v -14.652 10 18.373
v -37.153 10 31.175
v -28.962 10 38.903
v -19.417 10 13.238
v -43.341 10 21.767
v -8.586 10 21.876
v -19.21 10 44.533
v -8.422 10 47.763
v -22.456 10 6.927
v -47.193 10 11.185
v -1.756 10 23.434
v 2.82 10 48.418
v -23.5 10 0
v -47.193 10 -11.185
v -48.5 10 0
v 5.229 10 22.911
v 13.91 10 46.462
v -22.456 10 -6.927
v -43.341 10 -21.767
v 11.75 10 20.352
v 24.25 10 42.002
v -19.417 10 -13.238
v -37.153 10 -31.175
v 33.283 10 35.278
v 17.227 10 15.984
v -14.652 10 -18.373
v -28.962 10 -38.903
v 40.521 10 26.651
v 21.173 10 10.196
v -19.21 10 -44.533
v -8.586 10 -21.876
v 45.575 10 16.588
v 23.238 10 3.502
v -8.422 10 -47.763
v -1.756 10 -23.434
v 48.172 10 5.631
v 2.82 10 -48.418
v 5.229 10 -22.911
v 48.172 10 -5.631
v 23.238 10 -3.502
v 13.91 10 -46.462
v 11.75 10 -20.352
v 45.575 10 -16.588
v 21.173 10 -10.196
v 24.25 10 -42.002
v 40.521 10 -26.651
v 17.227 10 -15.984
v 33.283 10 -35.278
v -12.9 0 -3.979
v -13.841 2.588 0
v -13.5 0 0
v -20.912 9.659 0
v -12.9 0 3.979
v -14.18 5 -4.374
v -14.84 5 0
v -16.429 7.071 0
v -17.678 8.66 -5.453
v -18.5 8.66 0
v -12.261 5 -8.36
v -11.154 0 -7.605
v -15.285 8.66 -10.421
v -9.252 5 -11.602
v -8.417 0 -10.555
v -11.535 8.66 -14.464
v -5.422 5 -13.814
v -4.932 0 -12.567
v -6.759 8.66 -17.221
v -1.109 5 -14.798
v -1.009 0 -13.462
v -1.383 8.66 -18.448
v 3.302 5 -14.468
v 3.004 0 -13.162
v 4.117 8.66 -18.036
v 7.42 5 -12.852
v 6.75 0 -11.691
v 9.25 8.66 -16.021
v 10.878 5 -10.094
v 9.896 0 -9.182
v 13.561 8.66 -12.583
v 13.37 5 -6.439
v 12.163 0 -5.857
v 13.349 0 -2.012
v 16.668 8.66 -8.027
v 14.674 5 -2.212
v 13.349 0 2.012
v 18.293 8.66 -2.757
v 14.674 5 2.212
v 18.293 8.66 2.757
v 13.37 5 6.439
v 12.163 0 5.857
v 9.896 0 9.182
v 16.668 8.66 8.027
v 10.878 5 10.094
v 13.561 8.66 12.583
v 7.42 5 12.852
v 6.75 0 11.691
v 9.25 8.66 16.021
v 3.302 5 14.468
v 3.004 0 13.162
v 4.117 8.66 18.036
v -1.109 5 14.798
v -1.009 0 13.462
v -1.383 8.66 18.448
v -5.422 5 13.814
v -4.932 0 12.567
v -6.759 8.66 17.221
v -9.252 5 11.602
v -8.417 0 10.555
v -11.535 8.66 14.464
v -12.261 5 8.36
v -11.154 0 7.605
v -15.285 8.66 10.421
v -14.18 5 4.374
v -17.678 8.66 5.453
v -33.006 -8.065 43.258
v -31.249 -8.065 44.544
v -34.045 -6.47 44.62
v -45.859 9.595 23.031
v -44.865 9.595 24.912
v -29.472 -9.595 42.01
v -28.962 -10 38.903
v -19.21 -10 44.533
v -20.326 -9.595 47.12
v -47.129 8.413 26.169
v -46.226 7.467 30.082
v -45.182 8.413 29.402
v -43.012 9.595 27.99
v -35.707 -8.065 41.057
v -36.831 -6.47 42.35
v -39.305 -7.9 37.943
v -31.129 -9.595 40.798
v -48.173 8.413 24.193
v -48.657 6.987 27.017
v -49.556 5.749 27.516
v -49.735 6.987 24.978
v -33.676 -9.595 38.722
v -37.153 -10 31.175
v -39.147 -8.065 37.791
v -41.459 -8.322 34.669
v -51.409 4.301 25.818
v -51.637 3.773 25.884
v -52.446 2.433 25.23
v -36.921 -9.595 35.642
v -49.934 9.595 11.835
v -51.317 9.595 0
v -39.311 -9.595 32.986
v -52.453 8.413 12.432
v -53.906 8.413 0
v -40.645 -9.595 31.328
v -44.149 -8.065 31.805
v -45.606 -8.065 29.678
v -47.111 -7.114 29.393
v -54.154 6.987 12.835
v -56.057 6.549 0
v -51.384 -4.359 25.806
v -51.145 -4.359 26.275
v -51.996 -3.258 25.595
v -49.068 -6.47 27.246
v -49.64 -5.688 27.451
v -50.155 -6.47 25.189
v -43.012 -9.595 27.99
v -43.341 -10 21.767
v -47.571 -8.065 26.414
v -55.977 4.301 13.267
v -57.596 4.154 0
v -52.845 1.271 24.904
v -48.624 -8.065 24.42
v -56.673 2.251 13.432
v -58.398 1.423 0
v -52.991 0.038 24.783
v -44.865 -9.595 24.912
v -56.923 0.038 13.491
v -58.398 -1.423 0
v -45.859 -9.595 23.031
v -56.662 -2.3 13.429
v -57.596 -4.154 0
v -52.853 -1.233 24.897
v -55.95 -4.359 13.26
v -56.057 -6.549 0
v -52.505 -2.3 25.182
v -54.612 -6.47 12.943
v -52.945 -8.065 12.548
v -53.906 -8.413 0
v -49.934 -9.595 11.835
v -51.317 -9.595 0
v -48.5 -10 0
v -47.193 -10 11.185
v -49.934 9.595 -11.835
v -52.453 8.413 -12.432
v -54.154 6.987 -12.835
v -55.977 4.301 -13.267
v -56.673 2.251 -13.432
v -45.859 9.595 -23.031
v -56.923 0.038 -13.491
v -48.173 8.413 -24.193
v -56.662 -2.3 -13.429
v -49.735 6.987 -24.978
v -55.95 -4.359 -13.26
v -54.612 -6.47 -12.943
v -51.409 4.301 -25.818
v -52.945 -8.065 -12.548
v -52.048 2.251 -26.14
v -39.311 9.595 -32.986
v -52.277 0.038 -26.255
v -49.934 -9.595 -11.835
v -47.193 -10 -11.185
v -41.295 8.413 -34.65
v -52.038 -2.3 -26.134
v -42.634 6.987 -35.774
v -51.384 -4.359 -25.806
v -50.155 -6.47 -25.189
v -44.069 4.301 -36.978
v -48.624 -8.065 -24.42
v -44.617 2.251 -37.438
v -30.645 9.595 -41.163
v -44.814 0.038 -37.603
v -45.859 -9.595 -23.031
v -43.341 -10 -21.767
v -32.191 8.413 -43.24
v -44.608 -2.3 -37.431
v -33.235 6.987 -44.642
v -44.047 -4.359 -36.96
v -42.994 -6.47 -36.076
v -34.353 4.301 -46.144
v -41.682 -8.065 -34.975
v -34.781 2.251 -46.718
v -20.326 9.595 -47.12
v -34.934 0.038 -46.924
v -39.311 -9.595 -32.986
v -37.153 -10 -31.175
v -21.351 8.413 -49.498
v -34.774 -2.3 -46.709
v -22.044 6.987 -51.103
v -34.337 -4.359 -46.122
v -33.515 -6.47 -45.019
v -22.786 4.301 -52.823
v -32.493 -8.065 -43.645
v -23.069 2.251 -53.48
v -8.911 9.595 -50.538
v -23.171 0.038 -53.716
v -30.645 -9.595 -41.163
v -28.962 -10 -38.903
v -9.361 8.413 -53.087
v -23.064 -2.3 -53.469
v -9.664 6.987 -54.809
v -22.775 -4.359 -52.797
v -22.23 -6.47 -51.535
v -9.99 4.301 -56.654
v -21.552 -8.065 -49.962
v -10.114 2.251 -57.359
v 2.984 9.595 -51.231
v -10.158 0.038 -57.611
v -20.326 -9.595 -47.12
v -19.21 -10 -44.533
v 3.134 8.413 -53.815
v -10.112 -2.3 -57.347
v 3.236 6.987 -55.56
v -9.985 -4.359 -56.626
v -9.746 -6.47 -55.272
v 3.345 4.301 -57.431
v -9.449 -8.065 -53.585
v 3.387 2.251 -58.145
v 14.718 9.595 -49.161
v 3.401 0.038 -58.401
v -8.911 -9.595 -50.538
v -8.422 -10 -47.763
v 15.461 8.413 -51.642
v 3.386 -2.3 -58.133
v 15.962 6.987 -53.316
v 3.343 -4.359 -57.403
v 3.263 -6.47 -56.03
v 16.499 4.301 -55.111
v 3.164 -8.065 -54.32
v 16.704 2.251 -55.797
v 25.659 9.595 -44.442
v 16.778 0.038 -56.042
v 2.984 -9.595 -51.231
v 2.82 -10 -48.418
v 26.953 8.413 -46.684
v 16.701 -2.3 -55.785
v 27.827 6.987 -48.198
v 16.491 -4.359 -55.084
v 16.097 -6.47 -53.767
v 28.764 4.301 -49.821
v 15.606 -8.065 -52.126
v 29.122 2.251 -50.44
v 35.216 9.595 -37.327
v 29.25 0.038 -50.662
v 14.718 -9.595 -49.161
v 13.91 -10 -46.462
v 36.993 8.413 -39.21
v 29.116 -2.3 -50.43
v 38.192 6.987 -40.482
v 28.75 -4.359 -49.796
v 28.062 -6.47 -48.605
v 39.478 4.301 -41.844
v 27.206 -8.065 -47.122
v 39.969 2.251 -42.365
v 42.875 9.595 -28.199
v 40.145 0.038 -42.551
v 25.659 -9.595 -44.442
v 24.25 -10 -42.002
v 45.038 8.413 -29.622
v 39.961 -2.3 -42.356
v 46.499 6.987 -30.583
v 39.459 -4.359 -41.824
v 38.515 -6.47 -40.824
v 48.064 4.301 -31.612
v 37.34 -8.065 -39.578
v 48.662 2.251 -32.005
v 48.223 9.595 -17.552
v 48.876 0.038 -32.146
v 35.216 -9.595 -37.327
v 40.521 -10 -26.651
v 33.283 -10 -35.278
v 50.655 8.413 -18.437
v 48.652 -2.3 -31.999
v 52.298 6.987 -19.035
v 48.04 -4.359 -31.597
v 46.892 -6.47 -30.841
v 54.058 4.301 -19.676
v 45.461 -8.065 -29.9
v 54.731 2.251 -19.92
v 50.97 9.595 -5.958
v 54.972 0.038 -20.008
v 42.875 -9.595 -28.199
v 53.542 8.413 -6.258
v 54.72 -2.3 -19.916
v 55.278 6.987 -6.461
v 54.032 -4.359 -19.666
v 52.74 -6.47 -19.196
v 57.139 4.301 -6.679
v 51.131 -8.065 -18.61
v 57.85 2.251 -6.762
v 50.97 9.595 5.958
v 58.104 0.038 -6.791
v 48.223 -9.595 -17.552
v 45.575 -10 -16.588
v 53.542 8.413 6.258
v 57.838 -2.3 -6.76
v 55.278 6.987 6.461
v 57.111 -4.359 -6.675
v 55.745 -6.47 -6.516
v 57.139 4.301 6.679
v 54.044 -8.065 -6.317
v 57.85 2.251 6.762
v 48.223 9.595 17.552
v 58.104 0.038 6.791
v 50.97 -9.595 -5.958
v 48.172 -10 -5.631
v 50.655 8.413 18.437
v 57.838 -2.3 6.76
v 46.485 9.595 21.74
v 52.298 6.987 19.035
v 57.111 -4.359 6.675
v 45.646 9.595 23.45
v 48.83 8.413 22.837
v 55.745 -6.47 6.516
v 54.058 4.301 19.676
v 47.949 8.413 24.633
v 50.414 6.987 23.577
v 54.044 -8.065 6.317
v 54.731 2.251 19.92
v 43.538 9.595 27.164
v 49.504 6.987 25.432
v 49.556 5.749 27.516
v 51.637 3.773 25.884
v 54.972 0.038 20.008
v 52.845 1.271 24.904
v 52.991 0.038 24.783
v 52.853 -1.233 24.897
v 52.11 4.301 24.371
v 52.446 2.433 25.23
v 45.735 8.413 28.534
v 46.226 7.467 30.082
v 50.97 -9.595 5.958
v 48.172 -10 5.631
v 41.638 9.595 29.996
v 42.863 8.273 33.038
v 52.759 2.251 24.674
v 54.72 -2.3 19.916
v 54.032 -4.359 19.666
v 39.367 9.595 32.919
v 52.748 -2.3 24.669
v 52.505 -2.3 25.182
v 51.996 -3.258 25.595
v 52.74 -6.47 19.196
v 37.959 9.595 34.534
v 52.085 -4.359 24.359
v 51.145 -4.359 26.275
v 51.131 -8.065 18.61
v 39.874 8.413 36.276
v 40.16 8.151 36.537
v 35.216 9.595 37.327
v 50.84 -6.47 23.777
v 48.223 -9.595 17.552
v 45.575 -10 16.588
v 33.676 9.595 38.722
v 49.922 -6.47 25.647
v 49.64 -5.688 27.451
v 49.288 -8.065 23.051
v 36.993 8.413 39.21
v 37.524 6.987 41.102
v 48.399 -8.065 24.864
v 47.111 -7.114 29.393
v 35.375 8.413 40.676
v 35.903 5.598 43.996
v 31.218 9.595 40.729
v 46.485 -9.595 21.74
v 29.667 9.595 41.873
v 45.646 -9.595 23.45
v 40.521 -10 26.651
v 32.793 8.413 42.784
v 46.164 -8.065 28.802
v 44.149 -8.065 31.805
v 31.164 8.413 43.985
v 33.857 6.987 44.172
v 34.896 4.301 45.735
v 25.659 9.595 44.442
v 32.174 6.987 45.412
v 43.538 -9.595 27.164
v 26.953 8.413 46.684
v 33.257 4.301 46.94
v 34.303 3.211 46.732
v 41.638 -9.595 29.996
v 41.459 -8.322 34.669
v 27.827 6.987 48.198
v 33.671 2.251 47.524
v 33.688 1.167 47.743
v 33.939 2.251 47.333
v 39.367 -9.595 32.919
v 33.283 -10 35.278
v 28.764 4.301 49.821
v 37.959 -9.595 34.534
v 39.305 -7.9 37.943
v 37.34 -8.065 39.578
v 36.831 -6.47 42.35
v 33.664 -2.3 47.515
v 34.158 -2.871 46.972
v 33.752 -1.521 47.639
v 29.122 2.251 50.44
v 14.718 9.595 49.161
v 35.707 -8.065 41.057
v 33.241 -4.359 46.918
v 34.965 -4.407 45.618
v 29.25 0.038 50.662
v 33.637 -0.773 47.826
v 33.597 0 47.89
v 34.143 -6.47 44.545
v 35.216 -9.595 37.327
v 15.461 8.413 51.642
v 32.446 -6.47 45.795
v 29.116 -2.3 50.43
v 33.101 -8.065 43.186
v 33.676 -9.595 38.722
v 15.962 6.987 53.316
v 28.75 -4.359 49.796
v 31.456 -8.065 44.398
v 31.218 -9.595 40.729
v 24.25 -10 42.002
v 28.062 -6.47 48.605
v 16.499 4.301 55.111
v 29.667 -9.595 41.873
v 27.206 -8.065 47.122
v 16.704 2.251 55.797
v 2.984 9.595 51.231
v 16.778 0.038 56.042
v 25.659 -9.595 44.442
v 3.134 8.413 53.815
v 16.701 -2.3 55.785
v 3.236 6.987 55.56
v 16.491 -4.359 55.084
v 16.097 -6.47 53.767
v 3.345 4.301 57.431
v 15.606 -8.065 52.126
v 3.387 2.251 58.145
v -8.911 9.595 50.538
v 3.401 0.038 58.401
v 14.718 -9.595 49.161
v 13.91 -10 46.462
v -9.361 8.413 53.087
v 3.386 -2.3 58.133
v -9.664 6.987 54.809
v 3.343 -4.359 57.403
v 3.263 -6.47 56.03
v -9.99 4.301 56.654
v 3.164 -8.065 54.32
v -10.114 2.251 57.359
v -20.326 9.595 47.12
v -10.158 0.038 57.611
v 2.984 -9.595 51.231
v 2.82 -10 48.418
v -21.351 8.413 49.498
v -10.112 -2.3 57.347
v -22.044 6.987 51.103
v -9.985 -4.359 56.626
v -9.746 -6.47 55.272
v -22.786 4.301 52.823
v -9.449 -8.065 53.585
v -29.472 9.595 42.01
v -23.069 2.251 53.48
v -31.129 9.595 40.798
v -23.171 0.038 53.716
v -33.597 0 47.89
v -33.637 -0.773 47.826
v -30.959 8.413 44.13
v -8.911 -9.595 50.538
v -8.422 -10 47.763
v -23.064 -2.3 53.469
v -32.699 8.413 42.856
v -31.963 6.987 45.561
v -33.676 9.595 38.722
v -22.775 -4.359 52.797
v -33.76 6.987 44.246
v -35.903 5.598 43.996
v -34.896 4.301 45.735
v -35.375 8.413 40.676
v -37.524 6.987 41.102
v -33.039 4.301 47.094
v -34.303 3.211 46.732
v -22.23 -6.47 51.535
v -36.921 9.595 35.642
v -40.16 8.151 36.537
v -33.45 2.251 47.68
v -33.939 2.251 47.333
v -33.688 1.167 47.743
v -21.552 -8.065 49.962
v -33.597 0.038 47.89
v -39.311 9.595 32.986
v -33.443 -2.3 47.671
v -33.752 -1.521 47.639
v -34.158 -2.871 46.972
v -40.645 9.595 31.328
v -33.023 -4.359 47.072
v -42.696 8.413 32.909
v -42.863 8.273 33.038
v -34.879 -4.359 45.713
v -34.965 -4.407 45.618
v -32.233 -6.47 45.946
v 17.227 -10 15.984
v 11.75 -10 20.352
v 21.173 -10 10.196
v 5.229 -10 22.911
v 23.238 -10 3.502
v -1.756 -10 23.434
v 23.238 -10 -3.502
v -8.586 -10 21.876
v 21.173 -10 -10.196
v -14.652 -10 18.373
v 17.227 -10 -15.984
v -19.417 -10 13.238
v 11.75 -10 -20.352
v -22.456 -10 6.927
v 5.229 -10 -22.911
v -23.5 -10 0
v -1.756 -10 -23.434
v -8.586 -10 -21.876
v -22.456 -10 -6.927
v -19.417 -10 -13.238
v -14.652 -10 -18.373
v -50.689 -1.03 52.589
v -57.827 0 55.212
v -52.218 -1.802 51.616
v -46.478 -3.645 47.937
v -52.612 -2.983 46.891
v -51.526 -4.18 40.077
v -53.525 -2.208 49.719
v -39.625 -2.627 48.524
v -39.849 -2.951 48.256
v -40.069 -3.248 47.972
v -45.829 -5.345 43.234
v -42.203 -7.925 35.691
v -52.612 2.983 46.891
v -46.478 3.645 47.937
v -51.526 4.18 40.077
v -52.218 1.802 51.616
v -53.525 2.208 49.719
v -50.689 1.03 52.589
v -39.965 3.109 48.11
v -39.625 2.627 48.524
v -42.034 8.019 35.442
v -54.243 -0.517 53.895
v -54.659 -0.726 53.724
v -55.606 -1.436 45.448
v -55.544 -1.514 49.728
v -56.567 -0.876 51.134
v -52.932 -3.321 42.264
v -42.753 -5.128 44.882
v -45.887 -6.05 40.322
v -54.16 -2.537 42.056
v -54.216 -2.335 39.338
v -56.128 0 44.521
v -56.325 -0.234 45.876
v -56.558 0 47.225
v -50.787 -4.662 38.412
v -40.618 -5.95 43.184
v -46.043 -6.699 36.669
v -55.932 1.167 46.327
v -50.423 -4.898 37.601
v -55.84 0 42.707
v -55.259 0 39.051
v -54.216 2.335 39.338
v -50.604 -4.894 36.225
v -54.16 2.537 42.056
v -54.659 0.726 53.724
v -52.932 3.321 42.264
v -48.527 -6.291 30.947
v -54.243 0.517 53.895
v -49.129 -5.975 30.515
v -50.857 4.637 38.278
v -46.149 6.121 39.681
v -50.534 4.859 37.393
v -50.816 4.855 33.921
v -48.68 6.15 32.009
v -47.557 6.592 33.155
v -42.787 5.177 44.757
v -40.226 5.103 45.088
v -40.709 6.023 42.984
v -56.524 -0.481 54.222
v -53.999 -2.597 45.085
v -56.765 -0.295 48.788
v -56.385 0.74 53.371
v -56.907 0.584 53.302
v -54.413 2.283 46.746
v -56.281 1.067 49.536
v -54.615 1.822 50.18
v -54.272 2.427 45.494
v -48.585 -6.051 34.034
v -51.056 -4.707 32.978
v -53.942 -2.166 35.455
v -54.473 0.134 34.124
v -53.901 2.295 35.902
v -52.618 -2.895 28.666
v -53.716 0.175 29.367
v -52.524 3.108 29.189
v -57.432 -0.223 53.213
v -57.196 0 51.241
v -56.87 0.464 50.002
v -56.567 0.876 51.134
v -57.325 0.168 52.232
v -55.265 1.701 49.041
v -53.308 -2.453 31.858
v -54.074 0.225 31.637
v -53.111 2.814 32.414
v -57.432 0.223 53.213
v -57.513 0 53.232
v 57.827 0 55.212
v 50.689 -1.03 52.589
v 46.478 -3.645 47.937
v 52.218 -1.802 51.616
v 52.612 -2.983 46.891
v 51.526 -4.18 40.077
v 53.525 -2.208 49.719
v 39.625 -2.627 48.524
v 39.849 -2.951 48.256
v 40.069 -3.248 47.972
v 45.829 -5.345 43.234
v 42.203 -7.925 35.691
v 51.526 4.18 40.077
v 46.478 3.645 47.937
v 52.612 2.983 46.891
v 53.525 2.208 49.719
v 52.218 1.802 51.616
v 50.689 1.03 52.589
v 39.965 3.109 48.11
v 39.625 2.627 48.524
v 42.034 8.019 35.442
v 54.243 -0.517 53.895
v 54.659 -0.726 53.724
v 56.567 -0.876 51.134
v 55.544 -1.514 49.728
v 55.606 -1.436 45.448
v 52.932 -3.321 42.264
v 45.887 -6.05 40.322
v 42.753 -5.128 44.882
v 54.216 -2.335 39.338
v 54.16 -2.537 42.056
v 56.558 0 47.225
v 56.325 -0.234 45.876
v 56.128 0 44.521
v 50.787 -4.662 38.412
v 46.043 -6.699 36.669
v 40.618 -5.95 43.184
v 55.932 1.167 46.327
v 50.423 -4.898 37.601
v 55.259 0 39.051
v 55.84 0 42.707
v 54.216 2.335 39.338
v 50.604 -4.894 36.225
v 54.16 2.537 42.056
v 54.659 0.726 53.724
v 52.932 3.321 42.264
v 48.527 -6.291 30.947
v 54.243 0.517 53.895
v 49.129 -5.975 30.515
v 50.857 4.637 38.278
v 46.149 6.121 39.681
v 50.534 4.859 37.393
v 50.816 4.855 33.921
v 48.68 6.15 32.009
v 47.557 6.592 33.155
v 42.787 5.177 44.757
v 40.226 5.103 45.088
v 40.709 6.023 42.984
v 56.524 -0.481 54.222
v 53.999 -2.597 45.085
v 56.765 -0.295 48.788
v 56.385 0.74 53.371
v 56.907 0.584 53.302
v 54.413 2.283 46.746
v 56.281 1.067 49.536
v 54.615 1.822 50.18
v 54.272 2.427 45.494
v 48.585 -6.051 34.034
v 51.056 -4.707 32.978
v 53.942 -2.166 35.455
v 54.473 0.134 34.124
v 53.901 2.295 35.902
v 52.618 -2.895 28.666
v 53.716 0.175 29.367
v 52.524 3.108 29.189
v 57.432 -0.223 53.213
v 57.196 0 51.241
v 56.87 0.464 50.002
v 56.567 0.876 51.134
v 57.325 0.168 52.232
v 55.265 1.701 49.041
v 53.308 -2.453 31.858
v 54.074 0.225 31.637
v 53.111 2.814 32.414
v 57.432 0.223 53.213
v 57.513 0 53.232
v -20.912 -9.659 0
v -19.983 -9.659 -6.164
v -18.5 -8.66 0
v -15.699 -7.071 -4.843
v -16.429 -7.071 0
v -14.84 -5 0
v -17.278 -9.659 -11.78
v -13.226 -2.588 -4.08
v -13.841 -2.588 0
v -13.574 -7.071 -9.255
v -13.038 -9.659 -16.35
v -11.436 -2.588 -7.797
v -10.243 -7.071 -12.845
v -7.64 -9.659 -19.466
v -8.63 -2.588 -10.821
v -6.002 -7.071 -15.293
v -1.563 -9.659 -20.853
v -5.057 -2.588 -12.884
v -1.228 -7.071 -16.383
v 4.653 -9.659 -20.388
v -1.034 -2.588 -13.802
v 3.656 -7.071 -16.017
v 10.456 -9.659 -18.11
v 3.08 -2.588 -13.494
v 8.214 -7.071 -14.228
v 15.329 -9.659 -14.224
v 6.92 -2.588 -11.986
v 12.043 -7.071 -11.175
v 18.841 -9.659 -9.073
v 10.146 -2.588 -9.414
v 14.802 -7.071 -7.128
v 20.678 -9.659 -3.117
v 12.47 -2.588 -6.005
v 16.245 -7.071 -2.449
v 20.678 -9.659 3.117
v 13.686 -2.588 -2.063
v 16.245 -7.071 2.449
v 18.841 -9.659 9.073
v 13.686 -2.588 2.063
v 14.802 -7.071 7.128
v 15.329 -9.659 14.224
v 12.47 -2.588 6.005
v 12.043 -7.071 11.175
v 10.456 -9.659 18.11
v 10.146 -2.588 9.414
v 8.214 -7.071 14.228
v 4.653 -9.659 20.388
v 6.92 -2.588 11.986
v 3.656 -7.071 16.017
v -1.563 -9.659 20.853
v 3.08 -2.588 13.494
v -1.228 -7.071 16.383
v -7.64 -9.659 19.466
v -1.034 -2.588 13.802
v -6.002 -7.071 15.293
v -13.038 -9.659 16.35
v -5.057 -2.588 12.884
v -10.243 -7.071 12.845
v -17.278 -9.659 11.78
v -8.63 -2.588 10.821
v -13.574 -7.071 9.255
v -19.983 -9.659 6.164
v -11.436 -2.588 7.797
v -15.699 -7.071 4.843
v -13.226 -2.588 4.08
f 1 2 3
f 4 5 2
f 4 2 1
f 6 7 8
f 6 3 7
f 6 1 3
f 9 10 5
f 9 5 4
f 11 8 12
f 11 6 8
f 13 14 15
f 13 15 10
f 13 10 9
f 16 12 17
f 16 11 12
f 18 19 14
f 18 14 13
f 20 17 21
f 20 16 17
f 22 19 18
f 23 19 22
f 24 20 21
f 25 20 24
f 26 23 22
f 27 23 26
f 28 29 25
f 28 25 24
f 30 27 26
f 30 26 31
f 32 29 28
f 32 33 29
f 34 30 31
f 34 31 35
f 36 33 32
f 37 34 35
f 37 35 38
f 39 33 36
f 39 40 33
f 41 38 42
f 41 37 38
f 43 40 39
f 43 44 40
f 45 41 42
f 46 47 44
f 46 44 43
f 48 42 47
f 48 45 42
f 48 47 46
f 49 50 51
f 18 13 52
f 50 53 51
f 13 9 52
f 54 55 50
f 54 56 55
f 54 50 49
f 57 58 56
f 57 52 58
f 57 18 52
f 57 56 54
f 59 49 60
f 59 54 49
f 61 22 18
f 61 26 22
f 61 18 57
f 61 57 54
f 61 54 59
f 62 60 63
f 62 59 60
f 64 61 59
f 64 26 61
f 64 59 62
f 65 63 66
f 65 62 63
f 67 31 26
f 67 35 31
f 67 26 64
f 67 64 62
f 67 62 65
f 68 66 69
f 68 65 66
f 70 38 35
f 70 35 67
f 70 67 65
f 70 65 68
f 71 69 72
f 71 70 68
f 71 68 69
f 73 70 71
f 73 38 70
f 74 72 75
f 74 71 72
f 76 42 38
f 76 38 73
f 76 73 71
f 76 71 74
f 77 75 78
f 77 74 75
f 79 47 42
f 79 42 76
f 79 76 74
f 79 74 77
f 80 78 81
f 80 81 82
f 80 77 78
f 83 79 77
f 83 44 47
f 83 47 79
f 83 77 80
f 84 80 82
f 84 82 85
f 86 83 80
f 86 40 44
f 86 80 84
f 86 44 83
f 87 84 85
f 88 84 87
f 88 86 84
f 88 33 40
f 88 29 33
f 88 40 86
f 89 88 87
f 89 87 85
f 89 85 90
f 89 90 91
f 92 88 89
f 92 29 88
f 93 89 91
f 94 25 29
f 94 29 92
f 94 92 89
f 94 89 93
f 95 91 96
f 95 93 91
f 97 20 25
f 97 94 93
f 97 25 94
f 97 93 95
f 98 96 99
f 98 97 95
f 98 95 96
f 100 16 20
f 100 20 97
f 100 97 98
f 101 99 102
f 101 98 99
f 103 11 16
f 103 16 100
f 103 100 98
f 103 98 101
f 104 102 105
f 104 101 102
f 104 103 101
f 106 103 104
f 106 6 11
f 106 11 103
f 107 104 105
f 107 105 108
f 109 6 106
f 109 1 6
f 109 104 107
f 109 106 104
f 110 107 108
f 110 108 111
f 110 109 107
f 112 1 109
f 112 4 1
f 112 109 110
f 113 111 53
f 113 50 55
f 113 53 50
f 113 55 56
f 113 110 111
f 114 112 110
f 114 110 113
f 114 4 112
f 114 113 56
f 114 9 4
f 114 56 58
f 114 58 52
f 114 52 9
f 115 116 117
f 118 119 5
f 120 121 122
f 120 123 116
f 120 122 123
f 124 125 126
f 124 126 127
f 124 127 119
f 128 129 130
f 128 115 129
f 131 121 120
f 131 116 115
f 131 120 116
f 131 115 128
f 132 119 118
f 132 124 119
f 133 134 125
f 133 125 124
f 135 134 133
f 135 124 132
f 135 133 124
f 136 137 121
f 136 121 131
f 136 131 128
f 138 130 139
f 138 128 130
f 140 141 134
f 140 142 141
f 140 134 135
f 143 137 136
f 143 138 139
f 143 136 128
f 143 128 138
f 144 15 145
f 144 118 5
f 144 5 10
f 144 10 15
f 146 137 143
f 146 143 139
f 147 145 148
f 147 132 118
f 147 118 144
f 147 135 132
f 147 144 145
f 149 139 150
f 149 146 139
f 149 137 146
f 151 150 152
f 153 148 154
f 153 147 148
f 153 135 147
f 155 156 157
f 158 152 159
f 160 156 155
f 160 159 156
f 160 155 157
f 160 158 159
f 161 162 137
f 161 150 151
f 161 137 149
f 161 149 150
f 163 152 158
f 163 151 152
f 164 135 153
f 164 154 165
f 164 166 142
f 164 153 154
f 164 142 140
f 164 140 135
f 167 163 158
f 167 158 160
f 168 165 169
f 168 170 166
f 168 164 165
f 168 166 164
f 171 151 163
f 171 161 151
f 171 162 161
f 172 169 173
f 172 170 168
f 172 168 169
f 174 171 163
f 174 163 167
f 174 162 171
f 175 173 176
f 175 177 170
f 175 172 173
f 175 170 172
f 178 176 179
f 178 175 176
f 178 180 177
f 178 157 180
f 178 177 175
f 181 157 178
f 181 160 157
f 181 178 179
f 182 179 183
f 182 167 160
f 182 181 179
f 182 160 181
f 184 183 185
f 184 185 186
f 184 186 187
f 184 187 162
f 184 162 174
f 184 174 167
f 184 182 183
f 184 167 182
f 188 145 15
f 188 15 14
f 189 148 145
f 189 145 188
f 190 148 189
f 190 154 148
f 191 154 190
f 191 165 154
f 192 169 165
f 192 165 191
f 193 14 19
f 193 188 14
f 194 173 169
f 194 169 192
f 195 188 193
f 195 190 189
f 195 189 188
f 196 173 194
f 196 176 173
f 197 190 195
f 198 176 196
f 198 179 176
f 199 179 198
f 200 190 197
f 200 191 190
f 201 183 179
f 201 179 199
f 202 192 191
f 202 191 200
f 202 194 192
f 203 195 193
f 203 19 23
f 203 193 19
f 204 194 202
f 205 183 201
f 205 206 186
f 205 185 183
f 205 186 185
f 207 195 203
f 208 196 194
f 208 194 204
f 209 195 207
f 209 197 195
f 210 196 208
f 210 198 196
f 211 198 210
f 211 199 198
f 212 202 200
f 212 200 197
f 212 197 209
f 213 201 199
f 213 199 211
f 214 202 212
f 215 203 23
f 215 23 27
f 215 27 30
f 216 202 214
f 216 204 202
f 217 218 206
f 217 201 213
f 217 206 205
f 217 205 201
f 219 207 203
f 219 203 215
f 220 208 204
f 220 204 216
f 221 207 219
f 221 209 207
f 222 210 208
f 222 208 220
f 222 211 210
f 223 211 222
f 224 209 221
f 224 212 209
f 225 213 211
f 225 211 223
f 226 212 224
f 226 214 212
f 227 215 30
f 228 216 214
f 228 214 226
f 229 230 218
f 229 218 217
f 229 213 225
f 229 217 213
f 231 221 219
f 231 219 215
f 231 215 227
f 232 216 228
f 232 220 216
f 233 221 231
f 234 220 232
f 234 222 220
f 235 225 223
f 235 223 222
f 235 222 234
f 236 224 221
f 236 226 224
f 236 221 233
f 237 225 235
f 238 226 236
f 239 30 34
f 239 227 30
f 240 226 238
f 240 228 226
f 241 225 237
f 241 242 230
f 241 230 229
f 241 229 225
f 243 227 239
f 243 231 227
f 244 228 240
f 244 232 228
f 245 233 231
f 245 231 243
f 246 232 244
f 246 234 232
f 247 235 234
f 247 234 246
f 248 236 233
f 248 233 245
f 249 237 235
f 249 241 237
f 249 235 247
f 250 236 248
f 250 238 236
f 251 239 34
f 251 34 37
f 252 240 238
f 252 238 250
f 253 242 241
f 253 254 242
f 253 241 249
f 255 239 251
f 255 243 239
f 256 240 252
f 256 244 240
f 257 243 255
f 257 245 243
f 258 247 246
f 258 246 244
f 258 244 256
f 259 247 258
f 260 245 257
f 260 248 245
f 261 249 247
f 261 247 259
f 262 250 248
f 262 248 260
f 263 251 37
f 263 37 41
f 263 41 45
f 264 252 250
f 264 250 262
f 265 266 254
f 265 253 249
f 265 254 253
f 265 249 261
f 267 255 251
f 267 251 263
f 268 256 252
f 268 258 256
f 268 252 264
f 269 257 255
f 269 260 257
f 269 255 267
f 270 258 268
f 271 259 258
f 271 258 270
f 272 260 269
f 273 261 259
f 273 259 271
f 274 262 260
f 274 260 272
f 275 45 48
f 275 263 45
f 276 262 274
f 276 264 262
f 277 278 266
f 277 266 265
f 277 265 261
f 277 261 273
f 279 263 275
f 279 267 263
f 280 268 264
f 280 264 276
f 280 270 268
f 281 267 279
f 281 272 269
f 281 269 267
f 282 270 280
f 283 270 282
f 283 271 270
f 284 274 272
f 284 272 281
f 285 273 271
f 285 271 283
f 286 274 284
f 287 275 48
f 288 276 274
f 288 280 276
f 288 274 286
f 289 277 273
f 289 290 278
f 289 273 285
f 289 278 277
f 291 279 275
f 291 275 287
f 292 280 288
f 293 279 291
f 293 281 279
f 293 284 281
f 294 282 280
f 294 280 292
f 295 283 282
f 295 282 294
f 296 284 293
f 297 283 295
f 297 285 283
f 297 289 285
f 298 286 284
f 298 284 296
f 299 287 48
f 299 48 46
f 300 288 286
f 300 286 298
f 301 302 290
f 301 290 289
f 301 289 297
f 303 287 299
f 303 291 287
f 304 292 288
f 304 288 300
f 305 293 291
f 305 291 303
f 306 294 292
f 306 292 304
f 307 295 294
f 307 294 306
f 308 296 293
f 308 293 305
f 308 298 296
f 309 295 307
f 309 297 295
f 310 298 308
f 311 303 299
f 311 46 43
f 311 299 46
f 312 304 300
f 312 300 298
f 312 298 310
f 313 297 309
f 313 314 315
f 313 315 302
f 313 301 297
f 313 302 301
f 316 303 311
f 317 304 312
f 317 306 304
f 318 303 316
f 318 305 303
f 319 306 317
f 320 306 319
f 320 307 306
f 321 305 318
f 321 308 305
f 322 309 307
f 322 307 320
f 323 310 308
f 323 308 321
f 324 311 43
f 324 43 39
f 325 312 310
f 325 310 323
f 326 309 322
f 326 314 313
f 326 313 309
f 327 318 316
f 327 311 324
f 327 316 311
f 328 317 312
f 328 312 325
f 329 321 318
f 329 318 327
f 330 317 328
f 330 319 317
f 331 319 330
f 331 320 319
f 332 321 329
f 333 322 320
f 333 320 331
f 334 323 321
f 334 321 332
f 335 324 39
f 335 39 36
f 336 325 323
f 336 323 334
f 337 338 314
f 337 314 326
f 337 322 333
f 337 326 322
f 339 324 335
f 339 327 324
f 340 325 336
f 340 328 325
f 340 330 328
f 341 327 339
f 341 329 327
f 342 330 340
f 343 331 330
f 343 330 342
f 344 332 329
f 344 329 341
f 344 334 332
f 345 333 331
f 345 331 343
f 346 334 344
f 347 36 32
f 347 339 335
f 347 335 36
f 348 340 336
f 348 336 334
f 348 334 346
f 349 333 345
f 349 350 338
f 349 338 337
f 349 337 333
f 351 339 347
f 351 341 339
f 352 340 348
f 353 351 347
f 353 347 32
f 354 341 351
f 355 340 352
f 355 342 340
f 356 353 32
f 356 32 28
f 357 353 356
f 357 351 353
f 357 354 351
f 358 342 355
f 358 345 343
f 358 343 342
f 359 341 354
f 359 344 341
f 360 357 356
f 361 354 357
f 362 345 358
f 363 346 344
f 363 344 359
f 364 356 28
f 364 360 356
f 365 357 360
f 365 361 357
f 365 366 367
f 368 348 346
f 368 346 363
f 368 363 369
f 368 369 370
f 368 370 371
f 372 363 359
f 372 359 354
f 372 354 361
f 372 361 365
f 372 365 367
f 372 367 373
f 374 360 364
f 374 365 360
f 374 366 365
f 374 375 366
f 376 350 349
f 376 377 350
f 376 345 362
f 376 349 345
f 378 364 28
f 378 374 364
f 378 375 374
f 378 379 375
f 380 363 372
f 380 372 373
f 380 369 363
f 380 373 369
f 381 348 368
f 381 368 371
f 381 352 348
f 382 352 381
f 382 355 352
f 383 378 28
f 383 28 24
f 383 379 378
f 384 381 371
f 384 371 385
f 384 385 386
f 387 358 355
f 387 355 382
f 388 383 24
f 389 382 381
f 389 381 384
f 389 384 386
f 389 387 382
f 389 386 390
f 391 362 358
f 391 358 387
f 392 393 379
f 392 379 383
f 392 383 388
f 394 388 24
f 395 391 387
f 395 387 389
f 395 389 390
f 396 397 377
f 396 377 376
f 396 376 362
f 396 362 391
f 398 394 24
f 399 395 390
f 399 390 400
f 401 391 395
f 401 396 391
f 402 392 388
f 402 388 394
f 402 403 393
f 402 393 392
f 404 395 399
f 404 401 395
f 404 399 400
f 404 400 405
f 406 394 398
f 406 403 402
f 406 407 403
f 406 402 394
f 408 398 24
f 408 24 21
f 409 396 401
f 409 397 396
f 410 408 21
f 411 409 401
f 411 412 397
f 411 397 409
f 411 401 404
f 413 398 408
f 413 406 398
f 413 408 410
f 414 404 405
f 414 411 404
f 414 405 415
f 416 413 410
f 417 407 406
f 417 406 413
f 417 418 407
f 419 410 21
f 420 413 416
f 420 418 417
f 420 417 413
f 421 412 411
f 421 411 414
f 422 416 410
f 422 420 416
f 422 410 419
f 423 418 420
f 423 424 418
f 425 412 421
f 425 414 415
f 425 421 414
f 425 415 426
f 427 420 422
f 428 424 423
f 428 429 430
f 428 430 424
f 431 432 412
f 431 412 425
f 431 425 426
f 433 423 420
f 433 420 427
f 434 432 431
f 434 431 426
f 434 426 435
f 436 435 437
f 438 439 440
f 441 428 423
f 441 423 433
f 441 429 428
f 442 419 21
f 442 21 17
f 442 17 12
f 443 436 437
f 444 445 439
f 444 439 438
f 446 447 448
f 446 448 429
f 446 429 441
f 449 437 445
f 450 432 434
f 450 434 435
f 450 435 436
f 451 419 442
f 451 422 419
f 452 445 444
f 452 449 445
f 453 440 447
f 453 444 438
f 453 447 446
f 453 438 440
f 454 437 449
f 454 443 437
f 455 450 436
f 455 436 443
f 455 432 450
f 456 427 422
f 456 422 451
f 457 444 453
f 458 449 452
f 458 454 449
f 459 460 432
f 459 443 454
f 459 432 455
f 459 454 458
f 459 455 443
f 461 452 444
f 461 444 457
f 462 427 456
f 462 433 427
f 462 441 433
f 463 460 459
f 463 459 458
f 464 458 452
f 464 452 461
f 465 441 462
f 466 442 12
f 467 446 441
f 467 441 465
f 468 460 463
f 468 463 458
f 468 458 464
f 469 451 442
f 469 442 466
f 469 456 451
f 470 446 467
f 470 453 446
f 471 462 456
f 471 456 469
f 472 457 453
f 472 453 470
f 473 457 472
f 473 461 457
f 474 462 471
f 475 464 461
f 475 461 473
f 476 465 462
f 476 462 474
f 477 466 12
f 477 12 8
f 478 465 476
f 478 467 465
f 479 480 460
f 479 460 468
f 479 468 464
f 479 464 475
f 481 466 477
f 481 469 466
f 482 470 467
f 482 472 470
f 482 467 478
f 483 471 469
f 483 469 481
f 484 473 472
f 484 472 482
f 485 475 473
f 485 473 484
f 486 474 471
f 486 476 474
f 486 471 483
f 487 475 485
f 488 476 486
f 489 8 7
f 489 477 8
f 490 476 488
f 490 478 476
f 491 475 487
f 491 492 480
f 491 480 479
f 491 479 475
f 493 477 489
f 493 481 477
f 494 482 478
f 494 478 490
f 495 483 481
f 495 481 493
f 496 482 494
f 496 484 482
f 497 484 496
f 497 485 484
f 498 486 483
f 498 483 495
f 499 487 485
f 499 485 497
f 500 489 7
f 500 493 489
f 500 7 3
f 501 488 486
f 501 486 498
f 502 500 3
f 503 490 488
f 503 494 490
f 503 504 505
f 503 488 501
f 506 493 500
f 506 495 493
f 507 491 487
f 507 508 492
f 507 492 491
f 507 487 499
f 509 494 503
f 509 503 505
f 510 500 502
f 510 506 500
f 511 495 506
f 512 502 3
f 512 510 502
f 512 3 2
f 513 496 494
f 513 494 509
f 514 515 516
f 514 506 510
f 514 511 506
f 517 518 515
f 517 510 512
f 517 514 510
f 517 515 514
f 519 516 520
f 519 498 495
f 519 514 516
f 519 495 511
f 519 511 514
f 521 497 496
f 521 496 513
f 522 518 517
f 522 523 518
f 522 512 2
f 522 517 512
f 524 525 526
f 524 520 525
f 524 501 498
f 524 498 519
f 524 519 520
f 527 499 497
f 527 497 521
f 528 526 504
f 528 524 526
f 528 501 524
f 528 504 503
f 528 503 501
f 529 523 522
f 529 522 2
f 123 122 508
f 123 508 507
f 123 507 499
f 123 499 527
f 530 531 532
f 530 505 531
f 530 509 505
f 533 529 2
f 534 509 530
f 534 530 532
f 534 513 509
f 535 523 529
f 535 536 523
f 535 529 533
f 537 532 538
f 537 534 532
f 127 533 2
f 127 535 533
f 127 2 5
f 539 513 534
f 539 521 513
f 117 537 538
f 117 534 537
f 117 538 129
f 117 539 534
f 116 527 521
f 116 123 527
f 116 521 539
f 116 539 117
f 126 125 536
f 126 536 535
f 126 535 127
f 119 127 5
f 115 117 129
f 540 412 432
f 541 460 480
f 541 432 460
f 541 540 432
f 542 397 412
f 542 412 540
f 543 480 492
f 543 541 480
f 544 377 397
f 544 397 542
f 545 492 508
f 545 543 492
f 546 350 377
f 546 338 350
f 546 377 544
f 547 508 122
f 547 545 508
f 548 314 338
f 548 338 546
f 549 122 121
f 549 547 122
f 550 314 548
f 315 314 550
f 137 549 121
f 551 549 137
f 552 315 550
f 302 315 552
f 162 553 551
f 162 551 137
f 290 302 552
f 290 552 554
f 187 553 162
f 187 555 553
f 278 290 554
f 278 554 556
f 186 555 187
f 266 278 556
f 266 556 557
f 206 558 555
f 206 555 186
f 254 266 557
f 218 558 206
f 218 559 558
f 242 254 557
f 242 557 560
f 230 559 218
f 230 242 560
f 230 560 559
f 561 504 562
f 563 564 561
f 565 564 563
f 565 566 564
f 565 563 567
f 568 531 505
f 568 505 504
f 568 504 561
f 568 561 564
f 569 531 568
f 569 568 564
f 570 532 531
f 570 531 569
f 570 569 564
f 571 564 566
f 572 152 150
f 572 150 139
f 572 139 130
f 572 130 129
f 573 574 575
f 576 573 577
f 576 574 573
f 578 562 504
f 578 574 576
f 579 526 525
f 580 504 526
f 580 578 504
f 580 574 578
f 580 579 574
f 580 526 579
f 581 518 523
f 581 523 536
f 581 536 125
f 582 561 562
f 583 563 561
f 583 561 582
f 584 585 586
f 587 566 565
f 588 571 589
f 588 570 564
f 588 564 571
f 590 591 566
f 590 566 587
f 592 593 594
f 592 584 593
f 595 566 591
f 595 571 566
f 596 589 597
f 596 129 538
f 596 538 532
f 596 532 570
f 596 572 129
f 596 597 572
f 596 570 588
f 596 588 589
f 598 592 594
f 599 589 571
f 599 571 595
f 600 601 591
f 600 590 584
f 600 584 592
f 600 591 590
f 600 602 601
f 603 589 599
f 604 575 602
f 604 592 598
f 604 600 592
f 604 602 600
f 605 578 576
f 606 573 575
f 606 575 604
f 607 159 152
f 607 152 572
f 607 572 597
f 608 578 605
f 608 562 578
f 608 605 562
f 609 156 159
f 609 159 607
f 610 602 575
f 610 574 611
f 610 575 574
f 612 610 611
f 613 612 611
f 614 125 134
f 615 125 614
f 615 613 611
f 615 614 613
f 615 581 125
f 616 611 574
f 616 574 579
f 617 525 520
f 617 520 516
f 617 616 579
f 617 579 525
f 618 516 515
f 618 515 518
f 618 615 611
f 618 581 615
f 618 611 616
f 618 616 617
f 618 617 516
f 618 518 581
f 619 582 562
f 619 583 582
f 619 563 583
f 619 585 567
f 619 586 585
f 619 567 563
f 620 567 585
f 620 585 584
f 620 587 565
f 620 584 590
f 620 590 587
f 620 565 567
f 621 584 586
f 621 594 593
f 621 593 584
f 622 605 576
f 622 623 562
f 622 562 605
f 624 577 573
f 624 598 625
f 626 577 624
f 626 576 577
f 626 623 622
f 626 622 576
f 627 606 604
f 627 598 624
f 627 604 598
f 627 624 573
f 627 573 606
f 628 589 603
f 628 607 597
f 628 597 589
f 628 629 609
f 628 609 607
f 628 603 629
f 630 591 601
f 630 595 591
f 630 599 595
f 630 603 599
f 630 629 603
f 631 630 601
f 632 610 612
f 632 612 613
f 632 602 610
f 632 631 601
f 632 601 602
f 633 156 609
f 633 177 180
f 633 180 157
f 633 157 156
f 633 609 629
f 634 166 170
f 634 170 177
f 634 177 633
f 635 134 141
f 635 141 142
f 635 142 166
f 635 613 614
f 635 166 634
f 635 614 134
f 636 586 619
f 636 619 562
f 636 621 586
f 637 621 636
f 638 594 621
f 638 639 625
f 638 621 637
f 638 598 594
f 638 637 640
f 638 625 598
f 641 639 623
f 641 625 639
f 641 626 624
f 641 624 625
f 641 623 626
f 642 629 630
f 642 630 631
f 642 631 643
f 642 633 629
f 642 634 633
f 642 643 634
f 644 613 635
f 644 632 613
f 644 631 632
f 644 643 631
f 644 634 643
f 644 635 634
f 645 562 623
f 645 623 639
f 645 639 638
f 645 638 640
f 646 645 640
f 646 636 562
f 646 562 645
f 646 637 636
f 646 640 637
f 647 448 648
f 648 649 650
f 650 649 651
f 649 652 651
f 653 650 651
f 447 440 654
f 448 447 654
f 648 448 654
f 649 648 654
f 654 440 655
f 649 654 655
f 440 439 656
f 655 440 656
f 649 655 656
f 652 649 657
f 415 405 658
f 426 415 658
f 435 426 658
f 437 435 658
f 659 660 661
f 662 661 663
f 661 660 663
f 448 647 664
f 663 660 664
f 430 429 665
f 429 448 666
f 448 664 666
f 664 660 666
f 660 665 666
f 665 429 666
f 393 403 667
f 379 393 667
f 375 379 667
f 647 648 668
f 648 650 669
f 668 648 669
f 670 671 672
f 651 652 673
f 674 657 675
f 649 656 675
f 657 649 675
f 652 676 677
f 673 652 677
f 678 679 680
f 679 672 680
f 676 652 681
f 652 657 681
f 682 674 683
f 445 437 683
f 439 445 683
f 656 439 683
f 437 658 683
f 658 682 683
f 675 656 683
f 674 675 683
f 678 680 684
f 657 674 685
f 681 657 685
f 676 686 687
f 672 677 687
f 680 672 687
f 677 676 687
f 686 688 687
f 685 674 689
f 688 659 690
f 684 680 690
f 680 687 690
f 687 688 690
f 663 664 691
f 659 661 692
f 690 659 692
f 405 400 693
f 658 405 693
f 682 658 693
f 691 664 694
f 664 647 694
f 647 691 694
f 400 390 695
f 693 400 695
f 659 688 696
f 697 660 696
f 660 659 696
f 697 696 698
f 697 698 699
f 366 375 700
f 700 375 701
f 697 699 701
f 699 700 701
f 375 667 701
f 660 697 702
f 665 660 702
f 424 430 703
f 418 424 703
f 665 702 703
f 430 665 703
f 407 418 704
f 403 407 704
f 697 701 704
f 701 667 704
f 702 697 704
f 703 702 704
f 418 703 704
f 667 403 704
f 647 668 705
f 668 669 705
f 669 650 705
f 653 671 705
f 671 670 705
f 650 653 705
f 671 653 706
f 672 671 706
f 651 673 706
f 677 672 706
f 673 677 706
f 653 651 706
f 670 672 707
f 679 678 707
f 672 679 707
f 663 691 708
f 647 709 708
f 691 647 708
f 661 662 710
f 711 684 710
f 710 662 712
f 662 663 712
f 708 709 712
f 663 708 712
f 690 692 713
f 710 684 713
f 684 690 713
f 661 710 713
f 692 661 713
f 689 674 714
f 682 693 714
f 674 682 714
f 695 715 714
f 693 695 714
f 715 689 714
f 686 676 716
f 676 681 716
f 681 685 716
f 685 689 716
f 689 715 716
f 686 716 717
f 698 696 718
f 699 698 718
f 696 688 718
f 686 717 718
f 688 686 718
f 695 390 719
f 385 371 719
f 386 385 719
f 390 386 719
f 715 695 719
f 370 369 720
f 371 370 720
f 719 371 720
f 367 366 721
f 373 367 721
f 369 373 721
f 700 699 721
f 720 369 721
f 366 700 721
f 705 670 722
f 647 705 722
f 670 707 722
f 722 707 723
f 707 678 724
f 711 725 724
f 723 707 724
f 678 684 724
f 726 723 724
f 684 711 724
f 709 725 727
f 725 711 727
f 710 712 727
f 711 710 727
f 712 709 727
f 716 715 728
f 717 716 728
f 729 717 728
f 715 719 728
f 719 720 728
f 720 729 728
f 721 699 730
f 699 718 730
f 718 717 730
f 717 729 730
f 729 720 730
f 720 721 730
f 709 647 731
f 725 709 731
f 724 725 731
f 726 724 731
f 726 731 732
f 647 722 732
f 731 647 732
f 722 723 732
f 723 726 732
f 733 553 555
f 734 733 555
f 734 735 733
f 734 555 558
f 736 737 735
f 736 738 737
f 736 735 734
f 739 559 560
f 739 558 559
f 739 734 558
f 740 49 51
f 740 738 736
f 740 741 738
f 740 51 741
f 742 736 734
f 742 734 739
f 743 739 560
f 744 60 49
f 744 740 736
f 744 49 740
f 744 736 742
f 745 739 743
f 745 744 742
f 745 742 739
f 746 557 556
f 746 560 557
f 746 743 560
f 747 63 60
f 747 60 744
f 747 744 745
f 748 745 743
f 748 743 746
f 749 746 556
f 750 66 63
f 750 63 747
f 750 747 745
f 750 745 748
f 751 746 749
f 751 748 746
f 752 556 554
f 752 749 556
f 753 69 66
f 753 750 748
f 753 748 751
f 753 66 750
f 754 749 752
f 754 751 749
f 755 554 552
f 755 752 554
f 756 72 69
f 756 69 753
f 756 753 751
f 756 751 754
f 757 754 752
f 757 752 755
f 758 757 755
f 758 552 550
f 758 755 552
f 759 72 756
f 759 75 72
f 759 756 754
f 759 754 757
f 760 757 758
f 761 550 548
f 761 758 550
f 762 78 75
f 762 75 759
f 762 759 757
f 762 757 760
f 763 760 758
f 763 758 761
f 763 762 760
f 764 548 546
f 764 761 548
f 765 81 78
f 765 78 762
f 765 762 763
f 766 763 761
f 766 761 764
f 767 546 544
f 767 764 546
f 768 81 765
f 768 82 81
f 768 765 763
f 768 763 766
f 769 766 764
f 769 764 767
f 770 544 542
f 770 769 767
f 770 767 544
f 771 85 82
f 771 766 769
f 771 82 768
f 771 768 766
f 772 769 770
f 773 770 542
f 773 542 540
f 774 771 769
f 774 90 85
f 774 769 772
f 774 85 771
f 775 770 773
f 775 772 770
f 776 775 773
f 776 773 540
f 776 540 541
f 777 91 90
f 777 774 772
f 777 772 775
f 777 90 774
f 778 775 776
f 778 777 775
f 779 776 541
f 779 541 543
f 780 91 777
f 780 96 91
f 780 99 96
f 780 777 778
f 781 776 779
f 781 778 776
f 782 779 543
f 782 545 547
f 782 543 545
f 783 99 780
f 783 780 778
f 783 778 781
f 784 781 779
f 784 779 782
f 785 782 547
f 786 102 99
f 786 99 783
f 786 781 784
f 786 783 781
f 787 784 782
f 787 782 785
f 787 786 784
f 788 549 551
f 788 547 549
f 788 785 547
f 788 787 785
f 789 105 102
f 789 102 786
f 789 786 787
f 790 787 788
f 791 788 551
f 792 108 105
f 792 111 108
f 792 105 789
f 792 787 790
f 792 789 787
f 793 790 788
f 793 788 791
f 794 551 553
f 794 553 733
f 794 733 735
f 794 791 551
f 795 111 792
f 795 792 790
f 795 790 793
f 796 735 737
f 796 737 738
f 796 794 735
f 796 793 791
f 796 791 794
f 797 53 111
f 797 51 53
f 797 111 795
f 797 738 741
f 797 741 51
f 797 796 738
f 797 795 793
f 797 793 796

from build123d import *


with BuildPart() as f2:
    # F0 (on Top) → F2 (revolve)
    with BuildSketch(Plane.XY):
        with BuildLine():
            ThreePointArc((-48.5, -10), (-41.4289321881, -7.0710678119), (-38.5, 0))
            ThreePointArc((-38.5, 0), (-41.4289321881, 7.0710678119), (-48.5, 10))
            ThreePointArc((-48.5, 10), (-58.5, 0), (-48.5, -10))
        make_face()
        with BuildLine():
            ThreePointArc((-48.5, 10), (-41.4289321881, 7.0710678119), (-38.5, 0))
            ThreePointArc((-38.5, 0), (-41.4289321881, -7.0710678119), (-48.5, -10))
            Line((-48.5, -10), (-23.5, -10))
            ThreePointArc((-23.5, -10), (-33.5, 0), (-23.5, 10))
            Line((-23.5, 10), (-48.5, 10))
        make_face()
        with BuildLine():
            ThreePointArc((-13.5, 0), (-16.4289321881, 7.0710678119), (-23.5, 10))
            ThreePointArc((-23.5, 10), (-33.5, 0), (-23.5, -10))
            ThreePointArc((-23.5, -10), (-16.4289321881, -7.0710678119), (-13.5, 0))
        make_face()
    revolve(axis=Axis((0, 1.0170675814, 0), (0, -1, 0)))

    # F5 (on face) → F6 section 0
    with BuildSketch(Plane(origin=(-37.654770285, 0, 37.2117688785), x_dir=(0, 1, 0), z_dir=(0.711278432, 0, -0.7029103728)), mode=Mode.PRIVATE) as f6_s0:
        with BuildLine():
            add(Edge.make_bspline(
                [(0, 12.8881898709), (-14.9271422831, 12.8881898709), (-7.4635711415, -12.6903548371), (0, -38.2688995451), (7.4635711415, -12.6903548371), (14.9271422831, 12.8881898709), (0, 12.8881898709)],
                knots=[0, 0, 0, 2.0943951024, 2.0943951024, 4.1887902048, 4.1887902048, 6.2831853072, 6.2831853072, 6.2831853072], degree=2, weights=[1, 0.5, 1, 0.5, 1, 0.5, 1]))
        make_face()
    loft([Vertex(-57.8274913132, 0, 55.2121810615), f6_s0.sketch])

    # F7: F2 across plane


with BuildPart() as f2_1:
    add(f2.part)
    add(f2.part.mirror(Plane.YZ))


solid = f2_1.part
